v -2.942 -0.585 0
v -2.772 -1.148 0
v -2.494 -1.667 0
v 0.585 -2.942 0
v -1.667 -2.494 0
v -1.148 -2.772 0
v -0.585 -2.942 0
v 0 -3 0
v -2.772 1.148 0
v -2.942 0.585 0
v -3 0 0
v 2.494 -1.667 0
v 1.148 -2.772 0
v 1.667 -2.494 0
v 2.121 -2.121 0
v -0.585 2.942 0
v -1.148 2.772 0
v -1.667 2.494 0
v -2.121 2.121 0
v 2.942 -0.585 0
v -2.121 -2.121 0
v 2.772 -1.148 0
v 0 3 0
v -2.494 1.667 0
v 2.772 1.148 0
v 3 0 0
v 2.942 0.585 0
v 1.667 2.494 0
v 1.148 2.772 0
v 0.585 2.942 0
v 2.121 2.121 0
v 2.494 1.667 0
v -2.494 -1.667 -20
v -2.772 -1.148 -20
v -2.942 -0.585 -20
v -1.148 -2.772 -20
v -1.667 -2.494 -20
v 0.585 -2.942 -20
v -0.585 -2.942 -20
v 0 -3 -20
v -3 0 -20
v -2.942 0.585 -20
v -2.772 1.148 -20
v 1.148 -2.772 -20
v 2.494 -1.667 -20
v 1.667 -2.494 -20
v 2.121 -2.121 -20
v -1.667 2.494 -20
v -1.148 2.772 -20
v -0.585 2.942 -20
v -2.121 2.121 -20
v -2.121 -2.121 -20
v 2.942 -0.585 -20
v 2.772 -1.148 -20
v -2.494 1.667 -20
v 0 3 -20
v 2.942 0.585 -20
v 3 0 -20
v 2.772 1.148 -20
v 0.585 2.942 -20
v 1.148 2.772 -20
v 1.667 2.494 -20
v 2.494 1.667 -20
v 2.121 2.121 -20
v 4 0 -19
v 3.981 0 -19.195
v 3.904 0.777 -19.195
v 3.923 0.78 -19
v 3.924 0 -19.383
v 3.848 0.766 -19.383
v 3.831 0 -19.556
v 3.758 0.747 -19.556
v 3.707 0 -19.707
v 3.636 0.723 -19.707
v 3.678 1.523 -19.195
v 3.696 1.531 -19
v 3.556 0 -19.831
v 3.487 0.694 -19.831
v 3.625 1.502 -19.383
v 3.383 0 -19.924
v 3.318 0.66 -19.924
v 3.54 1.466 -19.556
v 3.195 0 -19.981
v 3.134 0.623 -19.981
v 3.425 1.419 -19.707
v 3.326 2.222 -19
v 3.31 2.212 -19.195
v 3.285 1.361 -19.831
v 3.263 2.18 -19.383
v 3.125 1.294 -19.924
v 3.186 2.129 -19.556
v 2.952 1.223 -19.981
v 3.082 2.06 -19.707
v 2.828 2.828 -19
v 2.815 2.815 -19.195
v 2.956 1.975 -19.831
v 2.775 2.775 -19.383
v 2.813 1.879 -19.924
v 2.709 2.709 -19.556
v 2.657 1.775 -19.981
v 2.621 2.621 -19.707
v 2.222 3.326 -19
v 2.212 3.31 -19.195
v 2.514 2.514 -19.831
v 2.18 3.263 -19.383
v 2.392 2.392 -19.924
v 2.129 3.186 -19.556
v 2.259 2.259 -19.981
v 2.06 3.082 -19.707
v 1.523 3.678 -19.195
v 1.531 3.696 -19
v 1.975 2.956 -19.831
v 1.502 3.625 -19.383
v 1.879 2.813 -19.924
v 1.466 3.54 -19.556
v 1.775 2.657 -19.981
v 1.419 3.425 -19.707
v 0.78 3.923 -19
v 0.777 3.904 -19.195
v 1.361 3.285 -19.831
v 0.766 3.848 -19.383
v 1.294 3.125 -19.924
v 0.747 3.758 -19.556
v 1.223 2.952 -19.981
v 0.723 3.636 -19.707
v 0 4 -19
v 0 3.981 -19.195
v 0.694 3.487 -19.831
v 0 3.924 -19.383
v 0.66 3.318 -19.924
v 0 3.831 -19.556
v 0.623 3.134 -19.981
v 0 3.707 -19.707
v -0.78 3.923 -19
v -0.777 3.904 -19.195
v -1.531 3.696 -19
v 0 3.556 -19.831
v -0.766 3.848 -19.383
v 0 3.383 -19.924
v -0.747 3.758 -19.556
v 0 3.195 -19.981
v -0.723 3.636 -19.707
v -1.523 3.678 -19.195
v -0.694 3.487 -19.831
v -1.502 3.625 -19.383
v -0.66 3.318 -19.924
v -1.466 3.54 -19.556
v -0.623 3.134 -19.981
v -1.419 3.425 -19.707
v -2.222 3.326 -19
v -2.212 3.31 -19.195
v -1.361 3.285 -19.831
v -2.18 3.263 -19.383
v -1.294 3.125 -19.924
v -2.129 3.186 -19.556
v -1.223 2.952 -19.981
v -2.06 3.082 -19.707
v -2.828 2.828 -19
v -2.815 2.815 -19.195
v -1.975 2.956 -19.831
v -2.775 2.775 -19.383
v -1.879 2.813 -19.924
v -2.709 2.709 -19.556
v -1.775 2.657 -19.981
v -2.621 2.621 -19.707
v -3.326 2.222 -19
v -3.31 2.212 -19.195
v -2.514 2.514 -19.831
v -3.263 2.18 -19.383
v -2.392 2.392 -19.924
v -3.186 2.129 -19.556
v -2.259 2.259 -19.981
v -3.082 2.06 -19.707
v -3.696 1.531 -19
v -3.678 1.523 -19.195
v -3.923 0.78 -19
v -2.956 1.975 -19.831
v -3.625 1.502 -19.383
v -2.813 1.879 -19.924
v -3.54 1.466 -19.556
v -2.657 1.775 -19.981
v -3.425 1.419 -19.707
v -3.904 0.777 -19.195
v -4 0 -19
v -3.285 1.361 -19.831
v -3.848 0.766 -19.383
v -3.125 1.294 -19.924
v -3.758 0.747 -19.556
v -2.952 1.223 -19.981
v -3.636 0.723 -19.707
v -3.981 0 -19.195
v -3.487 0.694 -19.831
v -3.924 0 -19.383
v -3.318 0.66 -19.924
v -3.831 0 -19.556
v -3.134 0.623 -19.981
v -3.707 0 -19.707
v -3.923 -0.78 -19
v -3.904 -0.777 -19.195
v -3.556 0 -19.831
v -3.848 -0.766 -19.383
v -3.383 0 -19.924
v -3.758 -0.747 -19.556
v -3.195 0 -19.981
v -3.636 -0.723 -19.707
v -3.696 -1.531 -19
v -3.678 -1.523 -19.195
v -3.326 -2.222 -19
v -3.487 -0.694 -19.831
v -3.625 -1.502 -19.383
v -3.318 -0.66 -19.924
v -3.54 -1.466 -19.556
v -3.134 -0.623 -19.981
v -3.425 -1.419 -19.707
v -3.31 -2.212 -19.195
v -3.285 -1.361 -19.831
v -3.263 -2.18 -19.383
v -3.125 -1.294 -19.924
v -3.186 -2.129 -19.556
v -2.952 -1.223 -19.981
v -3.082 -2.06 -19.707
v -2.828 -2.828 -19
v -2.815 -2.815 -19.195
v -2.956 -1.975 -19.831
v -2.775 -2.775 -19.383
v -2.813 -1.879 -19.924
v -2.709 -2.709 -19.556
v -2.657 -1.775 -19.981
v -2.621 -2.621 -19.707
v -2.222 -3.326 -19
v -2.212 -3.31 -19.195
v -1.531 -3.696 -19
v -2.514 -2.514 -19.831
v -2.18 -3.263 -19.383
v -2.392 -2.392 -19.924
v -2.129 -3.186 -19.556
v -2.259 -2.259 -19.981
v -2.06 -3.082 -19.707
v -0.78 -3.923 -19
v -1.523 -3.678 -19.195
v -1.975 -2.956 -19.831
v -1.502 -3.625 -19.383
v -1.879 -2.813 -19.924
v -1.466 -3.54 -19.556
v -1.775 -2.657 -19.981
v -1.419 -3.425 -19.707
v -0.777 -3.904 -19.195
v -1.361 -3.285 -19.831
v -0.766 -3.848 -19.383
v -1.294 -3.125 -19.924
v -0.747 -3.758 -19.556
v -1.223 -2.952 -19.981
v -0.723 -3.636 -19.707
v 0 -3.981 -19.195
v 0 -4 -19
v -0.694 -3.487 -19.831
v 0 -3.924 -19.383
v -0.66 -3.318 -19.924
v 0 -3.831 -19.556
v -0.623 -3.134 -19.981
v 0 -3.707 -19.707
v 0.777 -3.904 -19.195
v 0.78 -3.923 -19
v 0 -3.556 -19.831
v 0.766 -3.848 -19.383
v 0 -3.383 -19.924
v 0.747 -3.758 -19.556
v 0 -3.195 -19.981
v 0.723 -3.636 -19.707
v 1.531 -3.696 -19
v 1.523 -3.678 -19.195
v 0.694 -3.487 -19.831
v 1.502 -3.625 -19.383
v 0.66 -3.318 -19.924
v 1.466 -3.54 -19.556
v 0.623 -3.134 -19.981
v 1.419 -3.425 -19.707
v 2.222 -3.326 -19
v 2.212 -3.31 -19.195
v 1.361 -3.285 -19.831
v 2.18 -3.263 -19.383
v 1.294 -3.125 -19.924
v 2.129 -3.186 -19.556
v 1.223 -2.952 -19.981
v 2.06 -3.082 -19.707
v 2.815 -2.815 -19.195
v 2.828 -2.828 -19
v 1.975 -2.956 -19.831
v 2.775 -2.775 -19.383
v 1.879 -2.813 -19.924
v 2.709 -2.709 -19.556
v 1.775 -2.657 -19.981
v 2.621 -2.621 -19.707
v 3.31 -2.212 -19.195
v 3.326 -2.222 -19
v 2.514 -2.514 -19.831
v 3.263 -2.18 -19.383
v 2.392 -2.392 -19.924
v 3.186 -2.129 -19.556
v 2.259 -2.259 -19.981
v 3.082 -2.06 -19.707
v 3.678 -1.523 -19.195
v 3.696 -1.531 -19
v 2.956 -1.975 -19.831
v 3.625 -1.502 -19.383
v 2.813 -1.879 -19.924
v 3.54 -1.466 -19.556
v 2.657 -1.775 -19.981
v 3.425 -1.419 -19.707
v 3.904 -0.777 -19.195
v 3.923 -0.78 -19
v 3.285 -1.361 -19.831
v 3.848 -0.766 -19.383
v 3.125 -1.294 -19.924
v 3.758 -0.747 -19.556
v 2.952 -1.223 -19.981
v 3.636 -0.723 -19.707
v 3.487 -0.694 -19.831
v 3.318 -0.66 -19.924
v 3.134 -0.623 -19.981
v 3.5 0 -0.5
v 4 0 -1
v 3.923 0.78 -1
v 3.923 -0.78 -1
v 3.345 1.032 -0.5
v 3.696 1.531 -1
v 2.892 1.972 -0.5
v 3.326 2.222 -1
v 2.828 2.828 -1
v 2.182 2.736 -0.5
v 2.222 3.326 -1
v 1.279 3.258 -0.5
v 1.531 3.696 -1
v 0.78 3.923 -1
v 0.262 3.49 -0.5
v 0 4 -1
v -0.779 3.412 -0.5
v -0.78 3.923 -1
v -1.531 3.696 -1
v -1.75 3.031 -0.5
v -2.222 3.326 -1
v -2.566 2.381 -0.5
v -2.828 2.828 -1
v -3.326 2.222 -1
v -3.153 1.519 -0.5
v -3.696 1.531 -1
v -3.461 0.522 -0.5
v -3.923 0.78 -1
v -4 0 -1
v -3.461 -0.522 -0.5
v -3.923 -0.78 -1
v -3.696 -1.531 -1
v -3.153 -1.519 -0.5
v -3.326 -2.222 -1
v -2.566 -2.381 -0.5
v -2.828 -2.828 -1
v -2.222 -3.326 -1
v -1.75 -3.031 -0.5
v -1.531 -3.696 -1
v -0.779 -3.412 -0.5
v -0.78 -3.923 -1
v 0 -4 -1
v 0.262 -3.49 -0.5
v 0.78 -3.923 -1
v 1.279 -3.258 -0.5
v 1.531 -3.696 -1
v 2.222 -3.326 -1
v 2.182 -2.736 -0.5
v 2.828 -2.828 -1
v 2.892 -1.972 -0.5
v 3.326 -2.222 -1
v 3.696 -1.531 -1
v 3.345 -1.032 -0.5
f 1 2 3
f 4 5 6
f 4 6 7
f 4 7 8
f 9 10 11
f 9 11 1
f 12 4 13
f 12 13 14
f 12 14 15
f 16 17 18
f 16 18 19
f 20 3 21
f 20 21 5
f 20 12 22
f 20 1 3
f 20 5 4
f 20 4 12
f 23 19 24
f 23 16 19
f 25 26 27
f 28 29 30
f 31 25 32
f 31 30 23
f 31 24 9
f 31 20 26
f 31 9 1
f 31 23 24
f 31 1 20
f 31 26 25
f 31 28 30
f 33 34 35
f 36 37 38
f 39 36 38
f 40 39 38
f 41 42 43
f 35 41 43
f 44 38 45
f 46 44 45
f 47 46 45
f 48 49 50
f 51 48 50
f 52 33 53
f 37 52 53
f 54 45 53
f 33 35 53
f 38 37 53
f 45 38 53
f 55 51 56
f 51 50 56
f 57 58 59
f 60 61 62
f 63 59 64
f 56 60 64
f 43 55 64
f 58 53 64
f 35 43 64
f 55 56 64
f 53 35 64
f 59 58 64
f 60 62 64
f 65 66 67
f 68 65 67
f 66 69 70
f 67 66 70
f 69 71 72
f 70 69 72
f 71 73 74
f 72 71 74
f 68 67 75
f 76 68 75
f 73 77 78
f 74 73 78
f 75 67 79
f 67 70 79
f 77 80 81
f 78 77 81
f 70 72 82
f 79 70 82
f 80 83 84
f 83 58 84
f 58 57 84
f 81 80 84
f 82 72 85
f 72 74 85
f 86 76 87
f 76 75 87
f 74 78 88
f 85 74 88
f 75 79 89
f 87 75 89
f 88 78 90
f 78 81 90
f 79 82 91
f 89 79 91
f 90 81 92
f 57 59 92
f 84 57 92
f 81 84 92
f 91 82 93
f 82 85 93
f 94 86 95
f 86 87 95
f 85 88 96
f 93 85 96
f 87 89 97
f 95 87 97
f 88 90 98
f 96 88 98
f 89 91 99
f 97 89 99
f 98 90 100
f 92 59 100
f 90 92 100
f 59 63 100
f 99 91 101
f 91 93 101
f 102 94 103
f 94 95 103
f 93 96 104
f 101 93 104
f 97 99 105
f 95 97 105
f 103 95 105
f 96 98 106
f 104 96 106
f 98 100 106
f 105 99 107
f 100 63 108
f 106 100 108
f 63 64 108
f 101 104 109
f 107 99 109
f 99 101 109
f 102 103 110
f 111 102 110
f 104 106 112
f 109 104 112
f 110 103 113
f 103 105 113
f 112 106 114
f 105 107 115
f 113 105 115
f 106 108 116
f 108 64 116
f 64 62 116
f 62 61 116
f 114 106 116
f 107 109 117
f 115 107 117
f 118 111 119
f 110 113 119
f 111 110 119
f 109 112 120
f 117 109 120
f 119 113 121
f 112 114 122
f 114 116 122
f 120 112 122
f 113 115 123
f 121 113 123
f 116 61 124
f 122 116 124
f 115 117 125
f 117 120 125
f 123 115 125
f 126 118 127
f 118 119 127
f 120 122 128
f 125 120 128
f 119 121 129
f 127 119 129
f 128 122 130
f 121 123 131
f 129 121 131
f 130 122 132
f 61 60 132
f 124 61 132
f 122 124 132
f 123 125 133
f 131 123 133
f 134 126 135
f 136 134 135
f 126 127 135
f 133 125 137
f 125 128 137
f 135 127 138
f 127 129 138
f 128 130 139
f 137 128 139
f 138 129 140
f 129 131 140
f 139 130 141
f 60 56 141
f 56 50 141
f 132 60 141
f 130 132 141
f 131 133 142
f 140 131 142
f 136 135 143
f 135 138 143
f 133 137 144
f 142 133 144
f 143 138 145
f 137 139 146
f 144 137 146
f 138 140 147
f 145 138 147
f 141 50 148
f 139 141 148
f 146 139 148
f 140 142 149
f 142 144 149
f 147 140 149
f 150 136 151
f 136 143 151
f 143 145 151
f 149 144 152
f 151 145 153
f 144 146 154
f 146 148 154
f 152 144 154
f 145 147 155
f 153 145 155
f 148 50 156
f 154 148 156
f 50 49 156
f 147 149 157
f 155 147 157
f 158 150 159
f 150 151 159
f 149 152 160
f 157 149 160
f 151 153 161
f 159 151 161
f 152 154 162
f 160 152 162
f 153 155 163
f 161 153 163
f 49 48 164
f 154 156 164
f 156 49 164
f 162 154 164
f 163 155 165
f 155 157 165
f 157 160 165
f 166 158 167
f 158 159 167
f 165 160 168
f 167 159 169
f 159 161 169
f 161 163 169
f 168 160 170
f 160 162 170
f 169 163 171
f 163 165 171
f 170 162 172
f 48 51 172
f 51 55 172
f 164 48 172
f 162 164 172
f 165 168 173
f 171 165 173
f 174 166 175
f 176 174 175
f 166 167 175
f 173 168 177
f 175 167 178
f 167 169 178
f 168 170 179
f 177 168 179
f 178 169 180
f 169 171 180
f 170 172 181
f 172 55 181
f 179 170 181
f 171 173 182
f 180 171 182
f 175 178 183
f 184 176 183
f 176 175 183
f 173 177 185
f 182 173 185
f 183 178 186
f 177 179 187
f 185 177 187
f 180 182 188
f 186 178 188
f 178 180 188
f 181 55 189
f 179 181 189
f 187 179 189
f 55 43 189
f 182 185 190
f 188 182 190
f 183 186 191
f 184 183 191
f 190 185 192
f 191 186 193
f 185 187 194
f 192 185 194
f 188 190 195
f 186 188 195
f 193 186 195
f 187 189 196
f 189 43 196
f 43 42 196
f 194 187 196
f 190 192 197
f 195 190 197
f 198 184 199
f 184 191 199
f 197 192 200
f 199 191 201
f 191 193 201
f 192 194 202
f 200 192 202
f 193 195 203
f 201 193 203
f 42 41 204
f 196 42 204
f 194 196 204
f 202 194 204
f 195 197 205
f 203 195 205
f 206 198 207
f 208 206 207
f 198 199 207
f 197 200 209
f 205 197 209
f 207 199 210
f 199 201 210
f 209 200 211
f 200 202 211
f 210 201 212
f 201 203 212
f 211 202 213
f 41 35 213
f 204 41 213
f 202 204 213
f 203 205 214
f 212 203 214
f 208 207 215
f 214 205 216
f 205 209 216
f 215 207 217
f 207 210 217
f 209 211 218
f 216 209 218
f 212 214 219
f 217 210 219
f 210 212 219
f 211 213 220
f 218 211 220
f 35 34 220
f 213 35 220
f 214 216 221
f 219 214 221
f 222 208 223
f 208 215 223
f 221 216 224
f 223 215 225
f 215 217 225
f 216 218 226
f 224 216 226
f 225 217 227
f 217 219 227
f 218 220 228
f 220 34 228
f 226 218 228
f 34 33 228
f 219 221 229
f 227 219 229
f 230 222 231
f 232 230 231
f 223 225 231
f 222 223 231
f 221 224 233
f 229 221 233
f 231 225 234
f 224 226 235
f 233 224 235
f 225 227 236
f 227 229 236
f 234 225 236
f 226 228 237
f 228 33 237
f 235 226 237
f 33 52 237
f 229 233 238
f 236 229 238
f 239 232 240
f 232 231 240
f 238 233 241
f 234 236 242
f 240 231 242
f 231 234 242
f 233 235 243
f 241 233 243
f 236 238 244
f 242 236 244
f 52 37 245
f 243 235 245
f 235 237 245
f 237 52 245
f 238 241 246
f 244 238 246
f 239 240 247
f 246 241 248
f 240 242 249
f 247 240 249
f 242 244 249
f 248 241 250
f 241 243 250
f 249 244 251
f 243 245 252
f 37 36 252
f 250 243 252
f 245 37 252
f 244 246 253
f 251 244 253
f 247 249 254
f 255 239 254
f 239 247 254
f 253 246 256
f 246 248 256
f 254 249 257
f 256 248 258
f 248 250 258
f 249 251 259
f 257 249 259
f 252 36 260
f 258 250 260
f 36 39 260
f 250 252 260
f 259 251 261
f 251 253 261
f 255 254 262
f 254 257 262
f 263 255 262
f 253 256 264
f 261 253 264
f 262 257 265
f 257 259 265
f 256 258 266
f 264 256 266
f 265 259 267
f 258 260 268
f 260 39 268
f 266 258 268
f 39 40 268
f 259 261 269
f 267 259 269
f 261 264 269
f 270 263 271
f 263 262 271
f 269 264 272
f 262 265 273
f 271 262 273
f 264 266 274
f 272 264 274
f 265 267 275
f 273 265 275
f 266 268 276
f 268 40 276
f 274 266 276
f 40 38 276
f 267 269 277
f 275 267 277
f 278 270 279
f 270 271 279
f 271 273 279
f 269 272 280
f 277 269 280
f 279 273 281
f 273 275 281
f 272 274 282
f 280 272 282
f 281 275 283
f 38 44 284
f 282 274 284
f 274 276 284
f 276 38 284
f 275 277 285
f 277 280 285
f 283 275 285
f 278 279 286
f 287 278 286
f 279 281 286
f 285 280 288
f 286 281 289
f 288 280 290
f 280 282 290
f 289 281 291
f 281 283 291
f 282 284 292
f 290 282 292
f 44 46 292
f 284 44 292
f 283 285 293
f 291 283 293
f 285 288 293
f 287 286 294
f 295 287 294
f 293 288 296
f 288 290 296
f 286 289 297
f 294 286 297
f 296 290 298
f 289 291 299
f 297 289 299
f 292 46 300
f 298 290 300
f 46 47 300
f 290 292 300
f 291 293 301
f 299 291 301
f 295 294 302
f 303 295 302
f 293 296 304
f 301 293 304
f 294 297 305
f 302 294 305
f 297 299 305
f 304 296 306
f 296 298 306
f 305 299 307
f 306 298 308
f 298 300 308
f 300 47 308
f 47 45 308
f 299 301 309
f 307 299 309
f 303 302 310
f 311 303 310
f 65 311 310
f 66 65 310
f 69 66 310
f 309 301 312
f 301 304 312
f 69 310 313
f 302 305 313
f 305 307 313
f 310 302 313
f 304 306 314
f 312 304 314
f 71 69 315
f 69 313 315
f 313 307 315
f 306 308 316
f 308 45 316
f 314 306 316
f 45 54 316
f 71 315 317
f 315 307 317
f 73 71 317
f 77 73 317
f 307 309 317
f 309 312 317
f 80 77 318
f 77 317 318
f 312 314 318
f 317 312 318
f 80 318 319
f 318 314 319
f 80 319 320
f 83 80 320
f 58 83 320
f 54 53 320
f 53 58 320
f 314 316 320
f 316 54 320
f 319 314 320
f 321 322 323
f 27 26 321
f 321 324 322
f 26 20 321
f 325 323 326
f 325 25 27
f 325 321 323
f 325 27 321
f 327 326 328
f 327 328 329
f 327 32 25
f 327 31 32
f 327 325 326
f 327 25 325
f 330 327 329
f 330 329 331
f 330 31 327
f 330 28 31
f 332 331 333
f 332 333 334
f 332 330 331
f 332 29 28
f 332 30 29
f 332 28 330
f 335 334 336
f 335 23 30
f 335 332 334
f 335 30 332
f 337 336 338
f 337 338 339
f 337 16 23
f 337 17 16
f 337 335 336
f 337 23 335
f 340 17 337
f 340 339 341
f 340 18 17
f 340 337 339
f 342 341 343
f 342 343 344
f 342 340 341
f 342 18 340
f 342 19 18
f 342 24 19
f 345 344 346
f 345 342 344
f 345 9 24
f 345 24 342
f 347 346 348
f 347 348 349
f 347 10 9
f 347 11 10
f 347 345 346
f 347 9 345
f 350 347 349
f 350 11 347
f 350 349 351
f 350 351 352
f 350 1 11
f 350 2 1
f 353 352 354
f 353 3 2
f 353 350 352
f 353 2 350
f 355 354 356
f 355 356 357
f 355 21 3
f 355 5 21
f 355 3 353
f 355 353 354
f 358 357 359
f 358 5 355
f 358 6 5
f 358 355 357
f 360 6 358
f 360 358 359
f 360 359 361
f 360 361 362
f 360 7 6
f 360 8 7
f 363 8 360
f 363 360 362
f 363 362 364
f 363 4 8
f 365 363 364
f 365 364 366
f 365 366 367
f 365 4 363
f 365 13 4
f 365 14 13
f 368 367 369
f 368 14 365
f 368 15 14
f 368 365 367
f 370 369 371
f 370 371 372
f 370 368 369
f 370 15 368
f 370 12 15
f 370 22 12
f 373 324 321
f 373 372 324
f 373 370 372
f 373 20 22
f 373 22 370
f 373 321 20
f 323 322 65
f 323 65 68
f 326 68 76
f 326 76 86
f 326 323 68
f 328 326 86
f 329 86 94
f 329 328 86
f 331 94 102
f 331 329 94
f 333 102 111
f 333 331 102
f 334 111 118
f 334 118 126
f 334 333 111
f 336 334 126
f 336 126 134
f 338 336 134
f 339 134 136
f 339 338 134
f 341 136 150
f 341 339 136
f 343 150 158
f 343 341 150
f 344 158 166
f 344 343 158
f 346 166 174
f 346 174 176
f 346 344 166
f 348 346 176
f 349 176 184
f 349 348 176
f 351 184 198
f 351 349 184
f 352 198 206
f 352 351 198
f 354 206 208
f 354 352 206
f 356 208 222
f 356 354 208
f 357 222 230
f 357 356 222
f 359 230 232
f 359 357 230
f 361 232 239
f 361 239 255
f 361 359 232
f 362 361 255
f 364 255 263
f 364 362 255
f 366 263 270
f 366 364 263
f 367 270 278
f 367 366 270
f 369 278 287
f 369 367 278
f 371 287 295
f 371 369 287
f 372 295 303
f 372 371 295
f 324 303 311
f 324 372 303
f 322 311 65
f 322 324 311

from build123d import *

# Parameters (mm, degrees)
F0_R     = 4
F1_DEPTH = 20
F2_R     = 1
F3_SIZE  = 1


with BuildPart() as f1:
    # F0 (on Top) → F1 (new body)
    with BuildSketch(Plane.XY):
        Circle(F0_R)
    extrude(amount=-F1_DEPTH)

    # F2
    f2_edges = [f1.edges().sort_by_distance(p)[0] for p in [
        (-4, 0, -20),
    ]]
    fillet(f2_edges, radius=F2_R)

    # F3
    f3_edges = [f1.edges().sort_by_distance(p)[0] for p in [
        (-4, 0, 0),
    ]]
    chamfer(f3_edges, length=F3_SIZE)


solid = f1.part
